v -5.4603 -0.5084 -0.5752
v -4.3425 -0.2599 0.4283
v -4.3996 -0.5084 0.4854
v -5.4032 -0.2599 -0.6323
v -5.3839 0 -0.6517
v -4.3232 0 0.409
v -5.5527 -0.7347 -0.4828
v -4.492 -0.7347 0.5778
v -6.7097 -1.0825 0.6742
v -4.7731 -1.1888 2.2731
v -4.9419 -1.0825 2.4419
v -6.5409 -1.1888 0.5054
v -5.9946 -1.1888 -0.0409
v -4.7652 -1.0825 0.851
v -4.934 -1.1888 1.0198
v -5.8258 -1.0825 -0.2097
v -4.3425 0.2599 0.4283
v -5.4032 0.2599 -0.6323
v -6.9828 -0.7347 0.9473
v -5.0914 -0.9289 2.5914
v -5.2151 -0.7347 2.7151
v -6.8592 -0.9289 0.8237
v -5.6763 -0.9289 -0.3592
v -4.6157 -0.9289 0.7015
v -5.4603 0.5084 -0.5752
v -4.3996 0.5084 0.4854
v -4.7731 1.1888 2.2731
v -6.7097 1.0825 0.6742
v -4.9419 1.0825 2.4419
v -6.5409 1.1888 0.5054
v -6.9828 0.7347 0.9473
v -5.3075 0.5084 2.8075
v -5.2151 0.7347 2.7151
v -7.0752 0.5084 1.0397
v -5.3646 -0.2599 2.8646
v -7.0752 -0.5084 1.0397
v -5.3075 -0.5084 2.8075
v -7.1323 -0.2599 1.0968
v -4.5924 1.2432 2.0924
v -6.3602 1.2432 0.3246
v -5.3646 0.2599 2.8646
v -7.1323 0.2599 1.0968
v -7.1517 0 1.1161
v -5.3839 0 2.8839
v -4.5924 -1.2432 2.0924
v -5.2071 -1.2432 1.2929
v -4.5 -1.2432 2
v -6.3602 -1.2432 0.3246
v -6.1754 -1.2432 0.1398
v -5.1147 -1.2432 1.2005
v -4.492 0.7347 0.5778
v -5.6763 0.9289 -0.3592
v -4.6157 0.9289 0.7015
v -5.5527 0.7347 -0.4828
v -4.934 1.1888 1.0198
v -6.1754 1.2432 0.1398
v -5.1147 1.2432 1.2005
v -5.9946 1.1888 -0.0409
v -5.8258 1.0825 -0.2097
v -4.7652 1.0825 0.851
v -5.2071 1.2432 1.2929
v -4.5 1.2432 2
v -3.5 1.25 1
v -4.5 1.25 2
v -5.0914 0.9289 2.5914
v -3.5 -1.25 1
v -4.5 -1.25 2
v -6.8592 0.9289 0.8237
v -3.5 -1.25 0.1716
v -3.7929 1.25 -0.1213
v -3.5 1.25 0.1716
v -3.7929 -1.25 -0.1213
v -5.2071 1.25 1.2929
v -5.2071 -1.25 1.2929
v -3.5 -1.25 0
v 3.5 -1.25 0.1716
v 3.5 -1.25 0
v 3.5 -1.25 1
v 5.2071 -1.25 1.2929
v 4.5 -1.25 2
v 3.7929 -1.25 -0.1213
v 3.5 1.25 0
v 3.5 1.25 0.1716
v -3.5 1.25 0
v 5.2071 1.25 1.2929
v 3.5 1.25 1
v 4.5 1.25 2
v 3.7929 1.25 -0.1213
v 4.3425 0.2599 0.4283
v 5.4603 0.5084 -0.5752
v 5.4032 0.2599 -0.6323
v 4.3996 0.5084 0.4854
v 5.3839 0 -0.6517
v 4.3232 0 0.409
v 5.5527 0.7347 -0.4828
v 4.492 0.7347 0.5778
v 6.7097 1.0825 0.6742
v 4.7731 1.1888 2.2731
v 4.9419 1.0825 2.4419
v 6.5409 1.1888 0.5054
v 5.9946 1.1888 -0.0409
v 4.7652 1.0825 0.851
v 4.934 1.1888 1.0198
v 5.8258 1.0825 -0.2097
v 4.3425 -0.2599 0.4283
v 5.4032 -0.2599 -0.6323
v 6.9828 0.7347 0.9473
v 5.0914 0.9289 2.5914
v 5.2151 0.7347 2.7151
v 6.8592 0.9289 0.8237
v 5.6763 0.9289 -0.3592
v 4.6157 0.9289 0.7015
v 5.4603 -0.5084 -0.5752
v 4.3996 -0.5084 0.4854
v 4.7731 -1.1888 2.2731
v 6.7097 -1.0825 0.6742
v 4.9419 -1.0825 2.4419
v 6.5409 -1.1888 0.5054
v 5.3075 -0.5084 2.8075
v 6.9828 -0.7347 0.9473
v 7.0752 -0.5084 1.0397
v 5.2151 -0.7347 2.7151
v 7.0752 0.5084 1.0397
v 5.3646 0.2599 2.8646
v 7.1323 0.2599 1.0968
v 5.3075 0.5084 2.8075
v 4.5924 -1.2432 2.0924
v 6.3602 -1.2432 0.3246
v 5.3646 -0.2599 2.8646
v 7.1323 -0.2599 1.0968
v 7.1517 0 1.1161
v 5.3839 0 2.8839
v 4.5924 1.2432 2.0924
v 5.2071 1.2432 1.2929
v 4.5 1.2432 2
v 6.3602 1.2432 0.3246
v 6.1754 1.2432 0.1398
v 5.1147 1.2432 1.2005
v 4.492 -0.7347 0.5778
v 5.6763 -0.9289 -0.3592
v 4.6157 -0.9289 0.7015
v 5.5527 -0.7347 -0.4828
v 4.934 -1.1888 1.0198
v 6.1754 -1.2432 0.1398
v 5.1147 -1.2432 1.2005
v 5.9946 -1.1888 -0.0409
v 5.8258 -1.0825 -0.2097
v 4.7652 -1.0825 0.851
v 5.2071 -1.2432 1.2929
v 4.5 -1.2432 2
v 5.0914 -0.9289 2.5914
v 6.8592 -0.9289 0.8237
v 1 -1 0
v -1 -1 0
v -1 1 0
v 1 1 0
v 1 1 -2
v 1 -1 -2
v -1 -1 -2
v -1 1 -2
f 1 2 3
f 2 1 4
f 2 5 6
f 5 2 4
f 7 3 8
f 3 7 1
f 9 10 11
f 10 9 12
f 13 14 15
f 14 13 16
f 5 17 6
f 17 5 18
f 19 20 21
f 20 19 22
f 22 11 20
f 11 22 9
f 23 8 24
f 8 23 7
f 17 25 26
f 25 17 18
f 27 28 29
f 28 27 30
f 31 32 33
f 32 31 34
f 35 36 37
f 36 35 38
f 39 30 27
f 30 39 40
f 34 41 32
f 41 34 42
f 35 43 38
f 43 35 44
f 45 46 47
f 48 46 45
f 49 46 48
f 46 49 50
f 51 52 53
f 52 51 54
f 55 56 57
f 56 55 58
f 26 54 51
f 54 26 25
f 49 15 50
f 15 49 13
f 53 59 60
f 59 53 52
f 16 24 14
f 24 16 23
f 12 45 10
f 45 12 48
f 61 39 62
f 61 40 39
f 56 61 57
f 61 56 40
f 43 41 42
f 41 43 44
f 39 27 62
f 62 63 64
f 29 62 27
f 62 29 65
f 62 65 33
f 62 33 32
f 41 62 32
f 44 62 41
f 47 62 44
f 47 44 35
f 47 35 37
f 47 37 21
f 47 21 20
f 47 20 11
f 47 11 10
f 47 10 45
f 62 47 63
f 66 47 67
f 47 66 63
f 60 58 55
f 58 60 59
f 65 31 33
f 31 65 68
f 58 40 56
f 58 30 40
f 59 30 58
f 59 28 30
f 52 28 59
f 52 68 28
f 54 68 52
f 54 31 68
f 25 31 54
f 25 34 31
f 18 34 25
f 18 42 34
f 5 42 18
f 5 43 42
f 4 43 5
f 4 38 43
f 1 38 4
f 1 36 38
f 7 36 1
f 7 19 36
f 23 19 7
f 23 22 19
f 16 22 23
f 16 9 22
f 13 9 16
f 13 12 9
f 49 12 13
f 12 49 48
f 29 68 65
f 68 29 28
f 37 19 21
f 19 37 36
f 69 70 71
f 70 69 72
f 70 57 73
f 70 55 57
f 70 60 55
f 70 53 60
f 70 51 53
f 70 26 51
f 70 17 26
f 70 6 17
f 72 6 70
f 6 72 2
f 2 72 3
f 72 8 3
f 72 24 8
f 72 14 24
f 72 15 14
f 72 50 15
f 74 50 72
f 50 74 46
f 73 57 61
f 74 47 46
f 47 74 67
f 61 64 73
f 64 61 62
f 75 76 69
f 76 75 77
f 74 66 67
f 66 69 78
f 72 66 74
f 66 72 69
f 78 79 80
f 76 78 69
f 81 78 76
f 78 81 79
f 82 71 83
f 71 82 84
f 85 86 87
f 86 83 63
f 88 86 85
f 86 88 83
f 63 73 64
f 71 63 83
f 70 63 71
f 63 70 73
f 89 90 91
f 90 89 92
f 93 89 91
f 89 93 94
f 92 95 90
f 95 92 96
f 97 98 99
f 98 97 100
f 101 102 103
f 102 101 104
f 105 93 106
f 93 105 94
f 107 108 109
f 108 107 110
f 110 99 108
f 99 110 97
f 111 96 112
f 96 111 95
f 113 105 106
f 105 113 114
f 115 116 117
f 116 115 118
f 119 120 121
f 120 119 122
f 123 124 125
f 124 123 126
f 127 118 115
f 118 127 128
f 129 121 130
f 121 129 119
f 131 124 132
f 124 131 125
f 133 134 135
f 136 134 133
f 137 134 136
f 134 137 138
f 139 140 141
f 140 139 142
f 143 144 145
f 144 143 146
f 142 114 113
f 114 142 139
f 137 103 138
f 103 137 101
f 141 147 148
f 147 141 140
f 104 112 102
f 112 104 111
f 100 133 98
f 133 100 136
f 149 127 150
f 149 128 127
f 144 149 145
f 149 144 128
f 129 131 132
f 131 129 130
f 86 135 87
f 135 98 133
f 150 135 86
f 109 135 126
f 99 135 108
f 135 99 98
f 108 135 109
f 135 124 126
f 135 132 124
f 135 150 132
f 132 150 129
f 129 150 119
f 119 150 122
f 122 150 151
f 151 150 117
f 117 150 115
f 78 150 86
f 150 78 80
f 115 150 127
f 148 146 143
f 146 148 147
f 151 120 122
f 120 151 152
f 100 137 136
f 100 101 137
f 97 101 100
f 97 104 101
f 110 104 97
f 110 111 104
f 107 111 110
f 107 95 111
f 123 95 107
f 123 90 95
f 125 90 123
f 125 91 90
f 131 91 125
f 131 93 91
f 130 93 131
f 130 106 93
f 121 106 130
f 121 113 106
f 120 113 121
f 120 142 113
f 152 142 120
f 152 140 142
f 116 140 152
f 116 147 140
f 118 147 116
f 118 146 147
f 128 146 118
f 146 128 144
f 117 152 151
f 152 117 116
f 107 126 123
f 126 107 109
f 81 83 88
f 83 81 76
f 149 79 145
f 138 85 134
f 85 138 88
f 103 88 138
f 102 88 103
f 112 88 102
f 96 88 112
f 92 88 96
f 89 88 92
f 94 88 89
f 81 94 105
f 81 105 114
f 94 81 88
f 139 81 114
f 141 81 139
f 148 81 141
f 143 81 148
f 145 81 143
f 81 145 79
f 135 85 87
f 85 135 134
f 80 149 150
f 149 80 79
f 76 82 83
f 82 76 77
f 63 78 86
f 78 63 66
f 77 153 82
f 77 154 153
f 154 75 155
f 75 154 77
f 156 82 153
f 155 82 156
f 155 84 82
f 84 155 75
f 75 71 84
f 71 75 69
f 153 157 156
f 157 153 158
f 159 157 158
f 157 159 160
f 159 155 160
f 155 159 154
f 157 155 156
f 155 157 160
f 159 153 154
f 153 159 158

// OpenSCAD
$fn =30;
module peghole(){
    color("Blue")cylinder (6, .8, .8, true);
}
// the peg hole template, a change in size here changes hole everywhere
module peg(){
    cylinder (6, .8, .8, true);
}

module edge(){
cylinder (5, 3.25, 3.25, true);
}
// a cylinder for making block


module block(){
    intersection(){
edge();
rotate([90,0,0]) edge();
rotate([0, 90, 0]) edge();
}
}
// create the base cube without the holes


module blox(){
difference(){ 
block();
   peghole();
rotate ([90, 0, 0]) peghole();
rotate ([0, 90, 0]) peghole();
}
}
//unembeleshed blox cube

module cross(){
blox();
translate([5,0,0]) blox();
translate([-5,0,0]) blox();
translate([0,0,5]) blox();
translate([0,0,-5]) blox();
}
// central blox cross

module corner(){difference(){
    block();
   translate([-3,-3,3])rotate([0,45,0])
cube([8,6
   ,4]) color("Red");
 rotate([0,90,0])
   translate([0,0,-4]) peghole();
 translate([0,0,-4]) peghole();   
 rotate([0,45,0]) translate([0,0,1])peghole();   
}
}
    
//anled blox piece

module side(){
    blox();
    translate([0,0,5])corner();
translate([0,0,-5]) rotate([0,90,0]) corner();
}
// Pentagram side of octagon, can be own piece

module 3long() {
    blox();
    translate([0,0,5]) blox();
    translate([0,0,-5]) blox();
}

module opcorner(){
    translate([5,0,5]) corner();
translate([-5,0,-5]) rotate([0,180,0])corner();
}
// unused now

module oct() {
3long();
translate([5,0,0]) side();
translate([-5,0,0]) rotate([0,180,0]) side();
}
// one octagon of blox, can be used as own piece

module longside() {
side();
translate([0,5,0]) side();
translate([0,-5,0]) side();
}
// long side can be used as own piece

module hexlong(){
longside();
translate([-5,0,0]) rotate([0,180,0]) longside();
}
// long side in the combined form, usable as piece

module 3X3() {
3long();
translate([0,5,0]) 3long();
translate([0,-5,0]) 3long();
}
// plate of 3X3 blox can be used as own piece

module long(){
    oct();
translate([0,5,0]) oct();
translate([0,-5,0]) oct();
}
// octoganal tube with solid fill

module longhollow(){
difference(){
long();
cube([10,10,5], true);
cube([5,10,10], true);
}
}
// lighter octoganal tube

module test(){
translate([0,0,10]) blox();
rotate([0,45,0]) translate([0,0,9.5]) blox();
}
// set up angle for bracket design
module core() {
    color("Red") translate([0,0,2.5]) blox();
    color("Red");
}
// a test blox to position in cap
module caplower(){
CapPoints = [ [0,7.5,0],[5,2.5,0],[5,-2.5,0],[0,-7.5,0],[0,2.35,4.6],[2.35,2.35,4.6],[2.35,-2.35,4.6],[0,-2.35,4.6] ];
CapFaces = [ [0,1,2,3],[1,0,5],[3,2,6],[3,6,7],[3,7,4,0],[2,1,5,6],[5,4,7,6],[4,5,0] ];
polyhedron(CapPoints, CapFaces,convexity = 1);
}
// creates a cap with a petruding blox, needs finetuning
module halfflatcap() {
    CapPoints = [ [0,7.5,0],[5,2.5,0],[5,-2.5,0],[0,-7.5,0],[0,2.5,5],[2.5,2.5,5],[2.5,-2.5,5],[0,-2.5,5] ];
CapFaces = [ [3,2,1,0],[5,0,1],[6,2,3],[7,6,3],[0,4,7,3],[6,5,1,2],[6,7,4,5],[0,5,4] ];
difference(){
    polyhedron(CapPoints, CapFaces,convexity = 1);
translate([2.5,0,-1]) peghole();
translate([0,0,4]) peghole();
}
}
// make half a cao for hex with sides flush with top of blox
module fulflatcap() {
    halfflatcap();
rotate ([0,0,180]) halfflatcap();
}

// make cap for hex with sides flush with top of blox
module bracketbase(){
    difference(){
rotate([0,30,0])translate([1,0,-1]) cube([5,3,5], true);
translate([-2.5,0,-10]) test();
 translate([-4,-3,-3])cube([3,5,5]);translate([-.5,0,-4.5])rotate([0,30,0]) cube(4.1, true);translate([-4,-2,-5])cube(4);    
  }
}
// bracket for between wings
//difference(){
module wingspots(){
union(){
    rotate([0,-90,0]) side();
translate([0,0,-5])
union(){
   test();
rotate([0,0,180]) test();
}
}
}
// test of wing spots,
//why does diference with core not work
module test2() {
difference(){
    wingspots();
translate([0,0,5
   ]) cube(5.005
   ,true);
    //messing with a hairs breadth as blox() ads a tiny hight change
}
//blox();
}
// test for bracket between octagon angles
module bracketend(){
cylinder(2.5,1.25,1.25);
translate([0,-1.25,0]) cube([2,2.5,1]);
}
//translate([0,0,-2.5]) color("red") test2();
translate([-4.5,0,2]) rotate ([180,45,0]) bracketend();
translate([4.5,0,2]) rotate ([0,135,0]) bracketend();
translate([0,0,.5]) cube([7,2.5,1], true);
translate([0,0,-1]) cube(2,true);
